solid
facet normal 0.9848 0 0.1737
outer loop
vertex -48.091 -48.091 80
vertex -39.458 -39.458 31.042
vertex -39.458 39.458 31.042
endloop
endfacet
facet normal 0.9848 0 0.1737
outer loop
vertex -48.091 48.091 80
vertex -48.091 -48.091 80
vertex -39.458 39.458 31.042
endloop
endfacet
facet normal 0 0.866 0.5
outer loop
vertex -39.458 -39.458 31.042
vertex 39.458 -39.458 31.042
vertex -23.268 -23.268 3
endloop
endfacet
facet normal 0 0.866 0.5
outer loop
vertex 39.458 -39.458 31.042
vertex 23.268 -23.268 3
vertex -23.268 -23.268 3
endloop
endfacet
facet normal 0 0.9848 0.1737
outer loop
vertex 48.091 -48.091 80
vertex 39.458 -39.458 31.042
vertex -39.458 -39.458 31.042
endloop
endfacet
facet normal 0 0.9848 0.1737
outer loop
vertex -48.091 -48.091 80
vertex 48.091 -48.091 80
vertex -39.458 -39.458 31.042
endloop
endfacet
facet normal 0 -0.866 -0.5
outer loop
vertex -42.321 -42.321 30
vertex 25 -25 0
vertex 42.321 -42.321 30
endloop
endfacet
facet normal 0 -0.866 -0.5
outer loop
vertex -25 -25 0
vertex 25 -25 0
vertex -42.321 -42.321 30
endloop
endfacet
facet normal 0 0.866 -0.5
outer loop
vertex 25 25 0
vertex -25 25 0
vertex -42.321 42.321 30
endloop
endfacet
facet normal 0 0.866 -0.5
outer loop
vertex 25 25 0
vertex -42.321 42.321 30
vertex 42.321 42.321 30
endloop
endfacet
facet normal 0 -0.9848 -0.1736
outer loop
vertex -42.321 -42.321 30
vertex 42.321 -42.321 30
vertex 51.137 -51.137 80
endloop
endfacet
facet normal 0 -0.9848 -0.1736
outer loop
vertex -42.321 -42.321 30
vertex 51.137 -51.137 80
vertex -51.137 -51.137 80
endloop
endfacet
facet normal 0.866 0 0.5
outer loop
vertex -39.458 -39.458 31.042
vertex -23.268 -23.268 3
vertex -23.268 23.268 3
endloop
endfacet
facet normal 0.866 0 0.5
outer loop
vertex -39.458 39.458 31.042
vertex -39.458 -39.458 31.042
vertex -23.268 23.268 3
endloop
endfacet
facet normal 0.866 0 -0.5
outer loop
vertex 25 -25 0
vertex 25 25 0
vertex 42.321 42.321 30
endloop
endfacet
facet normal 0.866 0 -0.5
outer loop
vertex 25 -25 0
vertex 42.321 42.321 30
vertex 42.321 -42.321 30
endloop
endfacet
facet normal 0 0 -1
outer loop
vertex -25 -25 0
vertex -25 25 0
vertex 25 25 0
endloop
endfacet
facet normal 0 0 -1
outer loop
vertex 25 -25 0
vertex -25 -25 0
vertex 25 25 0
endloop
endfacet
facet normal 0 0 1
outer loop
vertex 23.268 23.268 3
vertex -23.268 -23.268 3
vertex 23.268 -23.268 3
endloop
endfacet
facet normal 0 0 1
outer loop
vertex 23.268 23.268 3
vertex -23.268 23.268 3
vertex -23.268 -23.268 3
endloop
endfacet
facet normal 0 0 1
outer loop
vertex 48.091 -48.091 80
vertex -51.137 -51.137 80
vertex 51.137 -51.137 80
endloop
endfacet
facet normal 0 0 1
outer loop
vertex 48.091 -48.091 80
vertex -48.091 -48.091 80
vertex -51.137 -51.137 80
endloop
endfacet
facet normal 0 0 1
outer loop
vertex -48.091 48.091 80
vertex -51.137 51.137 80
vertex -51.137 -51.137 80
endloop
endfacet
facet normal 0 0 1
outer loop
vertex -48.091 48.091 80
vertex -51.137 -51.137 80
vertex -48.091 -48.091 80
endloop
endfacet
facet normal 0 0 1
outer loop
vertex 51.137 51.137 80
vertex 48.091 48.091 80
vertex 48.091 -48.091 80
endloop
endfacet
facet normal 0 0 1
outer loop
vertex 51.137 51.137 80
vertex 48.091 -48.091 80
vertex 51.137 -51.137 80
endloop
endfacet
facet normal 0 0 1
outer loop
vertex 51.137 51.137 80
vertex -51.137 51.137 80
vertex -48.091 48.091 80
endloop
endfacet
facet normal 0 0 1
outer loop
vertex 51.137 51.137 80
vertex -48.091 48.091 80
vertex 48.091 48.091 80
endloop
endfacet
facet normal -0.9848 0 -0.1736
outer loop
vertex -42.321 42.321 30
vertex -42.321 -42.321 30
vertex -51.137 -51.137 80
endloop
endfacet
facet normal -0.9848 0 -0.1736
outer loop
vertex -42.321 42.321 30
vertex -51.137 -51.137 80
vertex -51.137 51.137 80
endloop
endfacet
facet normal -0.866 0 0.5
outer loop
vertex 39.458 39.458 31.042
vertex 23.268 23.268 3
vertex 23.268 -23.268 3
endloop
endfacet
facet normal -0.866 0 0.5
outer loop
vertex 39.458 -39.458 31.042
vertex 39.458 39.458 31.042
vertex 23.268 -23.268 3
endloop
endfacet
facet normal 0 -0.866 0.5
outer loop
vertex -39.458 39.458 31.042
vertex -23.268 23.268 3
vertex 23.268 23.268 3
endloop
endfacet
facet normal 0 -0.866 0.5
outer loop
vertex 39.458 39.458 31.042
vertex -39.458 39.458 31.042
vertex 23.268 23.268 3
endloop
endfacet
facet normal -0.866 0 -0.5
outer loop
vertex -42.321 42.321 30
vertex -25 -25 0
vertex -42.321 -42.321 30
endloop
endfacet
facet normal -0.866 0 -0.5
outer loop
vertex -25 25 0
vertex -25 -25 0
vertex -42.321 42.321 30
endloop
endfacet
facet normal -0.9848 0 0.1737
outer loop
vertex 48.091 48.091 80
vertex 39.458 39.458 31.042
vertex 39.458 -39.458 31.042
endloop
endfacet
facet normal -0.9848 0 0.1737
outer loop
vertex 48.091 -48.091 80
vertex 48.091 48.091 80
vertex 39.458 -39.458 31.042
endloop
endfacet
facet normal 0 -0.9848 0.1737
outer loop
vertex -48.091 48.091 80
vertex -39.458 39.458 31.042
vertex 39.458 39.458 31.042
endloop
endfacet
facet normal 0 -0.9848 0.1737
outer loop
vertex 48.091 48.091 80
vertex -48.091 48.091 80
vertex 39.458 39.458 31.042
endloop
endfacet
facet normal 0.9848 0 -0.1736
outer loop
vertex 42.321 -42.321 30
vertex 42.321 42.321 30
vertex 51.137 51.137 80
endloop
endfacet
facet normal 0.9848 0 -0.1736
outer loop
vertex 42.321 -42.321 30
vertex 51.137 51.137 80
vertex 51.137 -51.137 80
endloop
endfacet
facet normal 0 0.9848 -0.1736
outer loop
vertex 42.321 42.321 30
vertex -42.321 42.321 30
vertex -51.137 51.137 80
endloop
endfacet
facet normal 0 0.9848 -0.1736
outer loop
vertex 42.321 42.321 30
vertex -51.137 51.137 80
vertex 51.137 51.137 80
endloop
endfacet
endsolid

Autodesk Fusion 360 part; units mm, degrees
sketch "스케치1" plane through (0, 0, 0) normal (0, 0, 1) x (1, 0, 0)
  line L0 (-25, 25) -> (25, 25)
  line L1 (25, 25) -> (25, -25)
  line L2 (25, -25) -> (-25, -25)
  line L3 (-25, -25) -> (-25, 25)
extrude "돌출1" add sketch "스케치1" along normal blind 30 draft 30
extrude "돌출2" add 1 faces at (-14.1068, -14.1068, 30) along direction (0, 0, 1) blind 50 draft 10
shell "쉘1" thickness 3 removed faces 1 at (-17.0456, 17.0456, 80)
